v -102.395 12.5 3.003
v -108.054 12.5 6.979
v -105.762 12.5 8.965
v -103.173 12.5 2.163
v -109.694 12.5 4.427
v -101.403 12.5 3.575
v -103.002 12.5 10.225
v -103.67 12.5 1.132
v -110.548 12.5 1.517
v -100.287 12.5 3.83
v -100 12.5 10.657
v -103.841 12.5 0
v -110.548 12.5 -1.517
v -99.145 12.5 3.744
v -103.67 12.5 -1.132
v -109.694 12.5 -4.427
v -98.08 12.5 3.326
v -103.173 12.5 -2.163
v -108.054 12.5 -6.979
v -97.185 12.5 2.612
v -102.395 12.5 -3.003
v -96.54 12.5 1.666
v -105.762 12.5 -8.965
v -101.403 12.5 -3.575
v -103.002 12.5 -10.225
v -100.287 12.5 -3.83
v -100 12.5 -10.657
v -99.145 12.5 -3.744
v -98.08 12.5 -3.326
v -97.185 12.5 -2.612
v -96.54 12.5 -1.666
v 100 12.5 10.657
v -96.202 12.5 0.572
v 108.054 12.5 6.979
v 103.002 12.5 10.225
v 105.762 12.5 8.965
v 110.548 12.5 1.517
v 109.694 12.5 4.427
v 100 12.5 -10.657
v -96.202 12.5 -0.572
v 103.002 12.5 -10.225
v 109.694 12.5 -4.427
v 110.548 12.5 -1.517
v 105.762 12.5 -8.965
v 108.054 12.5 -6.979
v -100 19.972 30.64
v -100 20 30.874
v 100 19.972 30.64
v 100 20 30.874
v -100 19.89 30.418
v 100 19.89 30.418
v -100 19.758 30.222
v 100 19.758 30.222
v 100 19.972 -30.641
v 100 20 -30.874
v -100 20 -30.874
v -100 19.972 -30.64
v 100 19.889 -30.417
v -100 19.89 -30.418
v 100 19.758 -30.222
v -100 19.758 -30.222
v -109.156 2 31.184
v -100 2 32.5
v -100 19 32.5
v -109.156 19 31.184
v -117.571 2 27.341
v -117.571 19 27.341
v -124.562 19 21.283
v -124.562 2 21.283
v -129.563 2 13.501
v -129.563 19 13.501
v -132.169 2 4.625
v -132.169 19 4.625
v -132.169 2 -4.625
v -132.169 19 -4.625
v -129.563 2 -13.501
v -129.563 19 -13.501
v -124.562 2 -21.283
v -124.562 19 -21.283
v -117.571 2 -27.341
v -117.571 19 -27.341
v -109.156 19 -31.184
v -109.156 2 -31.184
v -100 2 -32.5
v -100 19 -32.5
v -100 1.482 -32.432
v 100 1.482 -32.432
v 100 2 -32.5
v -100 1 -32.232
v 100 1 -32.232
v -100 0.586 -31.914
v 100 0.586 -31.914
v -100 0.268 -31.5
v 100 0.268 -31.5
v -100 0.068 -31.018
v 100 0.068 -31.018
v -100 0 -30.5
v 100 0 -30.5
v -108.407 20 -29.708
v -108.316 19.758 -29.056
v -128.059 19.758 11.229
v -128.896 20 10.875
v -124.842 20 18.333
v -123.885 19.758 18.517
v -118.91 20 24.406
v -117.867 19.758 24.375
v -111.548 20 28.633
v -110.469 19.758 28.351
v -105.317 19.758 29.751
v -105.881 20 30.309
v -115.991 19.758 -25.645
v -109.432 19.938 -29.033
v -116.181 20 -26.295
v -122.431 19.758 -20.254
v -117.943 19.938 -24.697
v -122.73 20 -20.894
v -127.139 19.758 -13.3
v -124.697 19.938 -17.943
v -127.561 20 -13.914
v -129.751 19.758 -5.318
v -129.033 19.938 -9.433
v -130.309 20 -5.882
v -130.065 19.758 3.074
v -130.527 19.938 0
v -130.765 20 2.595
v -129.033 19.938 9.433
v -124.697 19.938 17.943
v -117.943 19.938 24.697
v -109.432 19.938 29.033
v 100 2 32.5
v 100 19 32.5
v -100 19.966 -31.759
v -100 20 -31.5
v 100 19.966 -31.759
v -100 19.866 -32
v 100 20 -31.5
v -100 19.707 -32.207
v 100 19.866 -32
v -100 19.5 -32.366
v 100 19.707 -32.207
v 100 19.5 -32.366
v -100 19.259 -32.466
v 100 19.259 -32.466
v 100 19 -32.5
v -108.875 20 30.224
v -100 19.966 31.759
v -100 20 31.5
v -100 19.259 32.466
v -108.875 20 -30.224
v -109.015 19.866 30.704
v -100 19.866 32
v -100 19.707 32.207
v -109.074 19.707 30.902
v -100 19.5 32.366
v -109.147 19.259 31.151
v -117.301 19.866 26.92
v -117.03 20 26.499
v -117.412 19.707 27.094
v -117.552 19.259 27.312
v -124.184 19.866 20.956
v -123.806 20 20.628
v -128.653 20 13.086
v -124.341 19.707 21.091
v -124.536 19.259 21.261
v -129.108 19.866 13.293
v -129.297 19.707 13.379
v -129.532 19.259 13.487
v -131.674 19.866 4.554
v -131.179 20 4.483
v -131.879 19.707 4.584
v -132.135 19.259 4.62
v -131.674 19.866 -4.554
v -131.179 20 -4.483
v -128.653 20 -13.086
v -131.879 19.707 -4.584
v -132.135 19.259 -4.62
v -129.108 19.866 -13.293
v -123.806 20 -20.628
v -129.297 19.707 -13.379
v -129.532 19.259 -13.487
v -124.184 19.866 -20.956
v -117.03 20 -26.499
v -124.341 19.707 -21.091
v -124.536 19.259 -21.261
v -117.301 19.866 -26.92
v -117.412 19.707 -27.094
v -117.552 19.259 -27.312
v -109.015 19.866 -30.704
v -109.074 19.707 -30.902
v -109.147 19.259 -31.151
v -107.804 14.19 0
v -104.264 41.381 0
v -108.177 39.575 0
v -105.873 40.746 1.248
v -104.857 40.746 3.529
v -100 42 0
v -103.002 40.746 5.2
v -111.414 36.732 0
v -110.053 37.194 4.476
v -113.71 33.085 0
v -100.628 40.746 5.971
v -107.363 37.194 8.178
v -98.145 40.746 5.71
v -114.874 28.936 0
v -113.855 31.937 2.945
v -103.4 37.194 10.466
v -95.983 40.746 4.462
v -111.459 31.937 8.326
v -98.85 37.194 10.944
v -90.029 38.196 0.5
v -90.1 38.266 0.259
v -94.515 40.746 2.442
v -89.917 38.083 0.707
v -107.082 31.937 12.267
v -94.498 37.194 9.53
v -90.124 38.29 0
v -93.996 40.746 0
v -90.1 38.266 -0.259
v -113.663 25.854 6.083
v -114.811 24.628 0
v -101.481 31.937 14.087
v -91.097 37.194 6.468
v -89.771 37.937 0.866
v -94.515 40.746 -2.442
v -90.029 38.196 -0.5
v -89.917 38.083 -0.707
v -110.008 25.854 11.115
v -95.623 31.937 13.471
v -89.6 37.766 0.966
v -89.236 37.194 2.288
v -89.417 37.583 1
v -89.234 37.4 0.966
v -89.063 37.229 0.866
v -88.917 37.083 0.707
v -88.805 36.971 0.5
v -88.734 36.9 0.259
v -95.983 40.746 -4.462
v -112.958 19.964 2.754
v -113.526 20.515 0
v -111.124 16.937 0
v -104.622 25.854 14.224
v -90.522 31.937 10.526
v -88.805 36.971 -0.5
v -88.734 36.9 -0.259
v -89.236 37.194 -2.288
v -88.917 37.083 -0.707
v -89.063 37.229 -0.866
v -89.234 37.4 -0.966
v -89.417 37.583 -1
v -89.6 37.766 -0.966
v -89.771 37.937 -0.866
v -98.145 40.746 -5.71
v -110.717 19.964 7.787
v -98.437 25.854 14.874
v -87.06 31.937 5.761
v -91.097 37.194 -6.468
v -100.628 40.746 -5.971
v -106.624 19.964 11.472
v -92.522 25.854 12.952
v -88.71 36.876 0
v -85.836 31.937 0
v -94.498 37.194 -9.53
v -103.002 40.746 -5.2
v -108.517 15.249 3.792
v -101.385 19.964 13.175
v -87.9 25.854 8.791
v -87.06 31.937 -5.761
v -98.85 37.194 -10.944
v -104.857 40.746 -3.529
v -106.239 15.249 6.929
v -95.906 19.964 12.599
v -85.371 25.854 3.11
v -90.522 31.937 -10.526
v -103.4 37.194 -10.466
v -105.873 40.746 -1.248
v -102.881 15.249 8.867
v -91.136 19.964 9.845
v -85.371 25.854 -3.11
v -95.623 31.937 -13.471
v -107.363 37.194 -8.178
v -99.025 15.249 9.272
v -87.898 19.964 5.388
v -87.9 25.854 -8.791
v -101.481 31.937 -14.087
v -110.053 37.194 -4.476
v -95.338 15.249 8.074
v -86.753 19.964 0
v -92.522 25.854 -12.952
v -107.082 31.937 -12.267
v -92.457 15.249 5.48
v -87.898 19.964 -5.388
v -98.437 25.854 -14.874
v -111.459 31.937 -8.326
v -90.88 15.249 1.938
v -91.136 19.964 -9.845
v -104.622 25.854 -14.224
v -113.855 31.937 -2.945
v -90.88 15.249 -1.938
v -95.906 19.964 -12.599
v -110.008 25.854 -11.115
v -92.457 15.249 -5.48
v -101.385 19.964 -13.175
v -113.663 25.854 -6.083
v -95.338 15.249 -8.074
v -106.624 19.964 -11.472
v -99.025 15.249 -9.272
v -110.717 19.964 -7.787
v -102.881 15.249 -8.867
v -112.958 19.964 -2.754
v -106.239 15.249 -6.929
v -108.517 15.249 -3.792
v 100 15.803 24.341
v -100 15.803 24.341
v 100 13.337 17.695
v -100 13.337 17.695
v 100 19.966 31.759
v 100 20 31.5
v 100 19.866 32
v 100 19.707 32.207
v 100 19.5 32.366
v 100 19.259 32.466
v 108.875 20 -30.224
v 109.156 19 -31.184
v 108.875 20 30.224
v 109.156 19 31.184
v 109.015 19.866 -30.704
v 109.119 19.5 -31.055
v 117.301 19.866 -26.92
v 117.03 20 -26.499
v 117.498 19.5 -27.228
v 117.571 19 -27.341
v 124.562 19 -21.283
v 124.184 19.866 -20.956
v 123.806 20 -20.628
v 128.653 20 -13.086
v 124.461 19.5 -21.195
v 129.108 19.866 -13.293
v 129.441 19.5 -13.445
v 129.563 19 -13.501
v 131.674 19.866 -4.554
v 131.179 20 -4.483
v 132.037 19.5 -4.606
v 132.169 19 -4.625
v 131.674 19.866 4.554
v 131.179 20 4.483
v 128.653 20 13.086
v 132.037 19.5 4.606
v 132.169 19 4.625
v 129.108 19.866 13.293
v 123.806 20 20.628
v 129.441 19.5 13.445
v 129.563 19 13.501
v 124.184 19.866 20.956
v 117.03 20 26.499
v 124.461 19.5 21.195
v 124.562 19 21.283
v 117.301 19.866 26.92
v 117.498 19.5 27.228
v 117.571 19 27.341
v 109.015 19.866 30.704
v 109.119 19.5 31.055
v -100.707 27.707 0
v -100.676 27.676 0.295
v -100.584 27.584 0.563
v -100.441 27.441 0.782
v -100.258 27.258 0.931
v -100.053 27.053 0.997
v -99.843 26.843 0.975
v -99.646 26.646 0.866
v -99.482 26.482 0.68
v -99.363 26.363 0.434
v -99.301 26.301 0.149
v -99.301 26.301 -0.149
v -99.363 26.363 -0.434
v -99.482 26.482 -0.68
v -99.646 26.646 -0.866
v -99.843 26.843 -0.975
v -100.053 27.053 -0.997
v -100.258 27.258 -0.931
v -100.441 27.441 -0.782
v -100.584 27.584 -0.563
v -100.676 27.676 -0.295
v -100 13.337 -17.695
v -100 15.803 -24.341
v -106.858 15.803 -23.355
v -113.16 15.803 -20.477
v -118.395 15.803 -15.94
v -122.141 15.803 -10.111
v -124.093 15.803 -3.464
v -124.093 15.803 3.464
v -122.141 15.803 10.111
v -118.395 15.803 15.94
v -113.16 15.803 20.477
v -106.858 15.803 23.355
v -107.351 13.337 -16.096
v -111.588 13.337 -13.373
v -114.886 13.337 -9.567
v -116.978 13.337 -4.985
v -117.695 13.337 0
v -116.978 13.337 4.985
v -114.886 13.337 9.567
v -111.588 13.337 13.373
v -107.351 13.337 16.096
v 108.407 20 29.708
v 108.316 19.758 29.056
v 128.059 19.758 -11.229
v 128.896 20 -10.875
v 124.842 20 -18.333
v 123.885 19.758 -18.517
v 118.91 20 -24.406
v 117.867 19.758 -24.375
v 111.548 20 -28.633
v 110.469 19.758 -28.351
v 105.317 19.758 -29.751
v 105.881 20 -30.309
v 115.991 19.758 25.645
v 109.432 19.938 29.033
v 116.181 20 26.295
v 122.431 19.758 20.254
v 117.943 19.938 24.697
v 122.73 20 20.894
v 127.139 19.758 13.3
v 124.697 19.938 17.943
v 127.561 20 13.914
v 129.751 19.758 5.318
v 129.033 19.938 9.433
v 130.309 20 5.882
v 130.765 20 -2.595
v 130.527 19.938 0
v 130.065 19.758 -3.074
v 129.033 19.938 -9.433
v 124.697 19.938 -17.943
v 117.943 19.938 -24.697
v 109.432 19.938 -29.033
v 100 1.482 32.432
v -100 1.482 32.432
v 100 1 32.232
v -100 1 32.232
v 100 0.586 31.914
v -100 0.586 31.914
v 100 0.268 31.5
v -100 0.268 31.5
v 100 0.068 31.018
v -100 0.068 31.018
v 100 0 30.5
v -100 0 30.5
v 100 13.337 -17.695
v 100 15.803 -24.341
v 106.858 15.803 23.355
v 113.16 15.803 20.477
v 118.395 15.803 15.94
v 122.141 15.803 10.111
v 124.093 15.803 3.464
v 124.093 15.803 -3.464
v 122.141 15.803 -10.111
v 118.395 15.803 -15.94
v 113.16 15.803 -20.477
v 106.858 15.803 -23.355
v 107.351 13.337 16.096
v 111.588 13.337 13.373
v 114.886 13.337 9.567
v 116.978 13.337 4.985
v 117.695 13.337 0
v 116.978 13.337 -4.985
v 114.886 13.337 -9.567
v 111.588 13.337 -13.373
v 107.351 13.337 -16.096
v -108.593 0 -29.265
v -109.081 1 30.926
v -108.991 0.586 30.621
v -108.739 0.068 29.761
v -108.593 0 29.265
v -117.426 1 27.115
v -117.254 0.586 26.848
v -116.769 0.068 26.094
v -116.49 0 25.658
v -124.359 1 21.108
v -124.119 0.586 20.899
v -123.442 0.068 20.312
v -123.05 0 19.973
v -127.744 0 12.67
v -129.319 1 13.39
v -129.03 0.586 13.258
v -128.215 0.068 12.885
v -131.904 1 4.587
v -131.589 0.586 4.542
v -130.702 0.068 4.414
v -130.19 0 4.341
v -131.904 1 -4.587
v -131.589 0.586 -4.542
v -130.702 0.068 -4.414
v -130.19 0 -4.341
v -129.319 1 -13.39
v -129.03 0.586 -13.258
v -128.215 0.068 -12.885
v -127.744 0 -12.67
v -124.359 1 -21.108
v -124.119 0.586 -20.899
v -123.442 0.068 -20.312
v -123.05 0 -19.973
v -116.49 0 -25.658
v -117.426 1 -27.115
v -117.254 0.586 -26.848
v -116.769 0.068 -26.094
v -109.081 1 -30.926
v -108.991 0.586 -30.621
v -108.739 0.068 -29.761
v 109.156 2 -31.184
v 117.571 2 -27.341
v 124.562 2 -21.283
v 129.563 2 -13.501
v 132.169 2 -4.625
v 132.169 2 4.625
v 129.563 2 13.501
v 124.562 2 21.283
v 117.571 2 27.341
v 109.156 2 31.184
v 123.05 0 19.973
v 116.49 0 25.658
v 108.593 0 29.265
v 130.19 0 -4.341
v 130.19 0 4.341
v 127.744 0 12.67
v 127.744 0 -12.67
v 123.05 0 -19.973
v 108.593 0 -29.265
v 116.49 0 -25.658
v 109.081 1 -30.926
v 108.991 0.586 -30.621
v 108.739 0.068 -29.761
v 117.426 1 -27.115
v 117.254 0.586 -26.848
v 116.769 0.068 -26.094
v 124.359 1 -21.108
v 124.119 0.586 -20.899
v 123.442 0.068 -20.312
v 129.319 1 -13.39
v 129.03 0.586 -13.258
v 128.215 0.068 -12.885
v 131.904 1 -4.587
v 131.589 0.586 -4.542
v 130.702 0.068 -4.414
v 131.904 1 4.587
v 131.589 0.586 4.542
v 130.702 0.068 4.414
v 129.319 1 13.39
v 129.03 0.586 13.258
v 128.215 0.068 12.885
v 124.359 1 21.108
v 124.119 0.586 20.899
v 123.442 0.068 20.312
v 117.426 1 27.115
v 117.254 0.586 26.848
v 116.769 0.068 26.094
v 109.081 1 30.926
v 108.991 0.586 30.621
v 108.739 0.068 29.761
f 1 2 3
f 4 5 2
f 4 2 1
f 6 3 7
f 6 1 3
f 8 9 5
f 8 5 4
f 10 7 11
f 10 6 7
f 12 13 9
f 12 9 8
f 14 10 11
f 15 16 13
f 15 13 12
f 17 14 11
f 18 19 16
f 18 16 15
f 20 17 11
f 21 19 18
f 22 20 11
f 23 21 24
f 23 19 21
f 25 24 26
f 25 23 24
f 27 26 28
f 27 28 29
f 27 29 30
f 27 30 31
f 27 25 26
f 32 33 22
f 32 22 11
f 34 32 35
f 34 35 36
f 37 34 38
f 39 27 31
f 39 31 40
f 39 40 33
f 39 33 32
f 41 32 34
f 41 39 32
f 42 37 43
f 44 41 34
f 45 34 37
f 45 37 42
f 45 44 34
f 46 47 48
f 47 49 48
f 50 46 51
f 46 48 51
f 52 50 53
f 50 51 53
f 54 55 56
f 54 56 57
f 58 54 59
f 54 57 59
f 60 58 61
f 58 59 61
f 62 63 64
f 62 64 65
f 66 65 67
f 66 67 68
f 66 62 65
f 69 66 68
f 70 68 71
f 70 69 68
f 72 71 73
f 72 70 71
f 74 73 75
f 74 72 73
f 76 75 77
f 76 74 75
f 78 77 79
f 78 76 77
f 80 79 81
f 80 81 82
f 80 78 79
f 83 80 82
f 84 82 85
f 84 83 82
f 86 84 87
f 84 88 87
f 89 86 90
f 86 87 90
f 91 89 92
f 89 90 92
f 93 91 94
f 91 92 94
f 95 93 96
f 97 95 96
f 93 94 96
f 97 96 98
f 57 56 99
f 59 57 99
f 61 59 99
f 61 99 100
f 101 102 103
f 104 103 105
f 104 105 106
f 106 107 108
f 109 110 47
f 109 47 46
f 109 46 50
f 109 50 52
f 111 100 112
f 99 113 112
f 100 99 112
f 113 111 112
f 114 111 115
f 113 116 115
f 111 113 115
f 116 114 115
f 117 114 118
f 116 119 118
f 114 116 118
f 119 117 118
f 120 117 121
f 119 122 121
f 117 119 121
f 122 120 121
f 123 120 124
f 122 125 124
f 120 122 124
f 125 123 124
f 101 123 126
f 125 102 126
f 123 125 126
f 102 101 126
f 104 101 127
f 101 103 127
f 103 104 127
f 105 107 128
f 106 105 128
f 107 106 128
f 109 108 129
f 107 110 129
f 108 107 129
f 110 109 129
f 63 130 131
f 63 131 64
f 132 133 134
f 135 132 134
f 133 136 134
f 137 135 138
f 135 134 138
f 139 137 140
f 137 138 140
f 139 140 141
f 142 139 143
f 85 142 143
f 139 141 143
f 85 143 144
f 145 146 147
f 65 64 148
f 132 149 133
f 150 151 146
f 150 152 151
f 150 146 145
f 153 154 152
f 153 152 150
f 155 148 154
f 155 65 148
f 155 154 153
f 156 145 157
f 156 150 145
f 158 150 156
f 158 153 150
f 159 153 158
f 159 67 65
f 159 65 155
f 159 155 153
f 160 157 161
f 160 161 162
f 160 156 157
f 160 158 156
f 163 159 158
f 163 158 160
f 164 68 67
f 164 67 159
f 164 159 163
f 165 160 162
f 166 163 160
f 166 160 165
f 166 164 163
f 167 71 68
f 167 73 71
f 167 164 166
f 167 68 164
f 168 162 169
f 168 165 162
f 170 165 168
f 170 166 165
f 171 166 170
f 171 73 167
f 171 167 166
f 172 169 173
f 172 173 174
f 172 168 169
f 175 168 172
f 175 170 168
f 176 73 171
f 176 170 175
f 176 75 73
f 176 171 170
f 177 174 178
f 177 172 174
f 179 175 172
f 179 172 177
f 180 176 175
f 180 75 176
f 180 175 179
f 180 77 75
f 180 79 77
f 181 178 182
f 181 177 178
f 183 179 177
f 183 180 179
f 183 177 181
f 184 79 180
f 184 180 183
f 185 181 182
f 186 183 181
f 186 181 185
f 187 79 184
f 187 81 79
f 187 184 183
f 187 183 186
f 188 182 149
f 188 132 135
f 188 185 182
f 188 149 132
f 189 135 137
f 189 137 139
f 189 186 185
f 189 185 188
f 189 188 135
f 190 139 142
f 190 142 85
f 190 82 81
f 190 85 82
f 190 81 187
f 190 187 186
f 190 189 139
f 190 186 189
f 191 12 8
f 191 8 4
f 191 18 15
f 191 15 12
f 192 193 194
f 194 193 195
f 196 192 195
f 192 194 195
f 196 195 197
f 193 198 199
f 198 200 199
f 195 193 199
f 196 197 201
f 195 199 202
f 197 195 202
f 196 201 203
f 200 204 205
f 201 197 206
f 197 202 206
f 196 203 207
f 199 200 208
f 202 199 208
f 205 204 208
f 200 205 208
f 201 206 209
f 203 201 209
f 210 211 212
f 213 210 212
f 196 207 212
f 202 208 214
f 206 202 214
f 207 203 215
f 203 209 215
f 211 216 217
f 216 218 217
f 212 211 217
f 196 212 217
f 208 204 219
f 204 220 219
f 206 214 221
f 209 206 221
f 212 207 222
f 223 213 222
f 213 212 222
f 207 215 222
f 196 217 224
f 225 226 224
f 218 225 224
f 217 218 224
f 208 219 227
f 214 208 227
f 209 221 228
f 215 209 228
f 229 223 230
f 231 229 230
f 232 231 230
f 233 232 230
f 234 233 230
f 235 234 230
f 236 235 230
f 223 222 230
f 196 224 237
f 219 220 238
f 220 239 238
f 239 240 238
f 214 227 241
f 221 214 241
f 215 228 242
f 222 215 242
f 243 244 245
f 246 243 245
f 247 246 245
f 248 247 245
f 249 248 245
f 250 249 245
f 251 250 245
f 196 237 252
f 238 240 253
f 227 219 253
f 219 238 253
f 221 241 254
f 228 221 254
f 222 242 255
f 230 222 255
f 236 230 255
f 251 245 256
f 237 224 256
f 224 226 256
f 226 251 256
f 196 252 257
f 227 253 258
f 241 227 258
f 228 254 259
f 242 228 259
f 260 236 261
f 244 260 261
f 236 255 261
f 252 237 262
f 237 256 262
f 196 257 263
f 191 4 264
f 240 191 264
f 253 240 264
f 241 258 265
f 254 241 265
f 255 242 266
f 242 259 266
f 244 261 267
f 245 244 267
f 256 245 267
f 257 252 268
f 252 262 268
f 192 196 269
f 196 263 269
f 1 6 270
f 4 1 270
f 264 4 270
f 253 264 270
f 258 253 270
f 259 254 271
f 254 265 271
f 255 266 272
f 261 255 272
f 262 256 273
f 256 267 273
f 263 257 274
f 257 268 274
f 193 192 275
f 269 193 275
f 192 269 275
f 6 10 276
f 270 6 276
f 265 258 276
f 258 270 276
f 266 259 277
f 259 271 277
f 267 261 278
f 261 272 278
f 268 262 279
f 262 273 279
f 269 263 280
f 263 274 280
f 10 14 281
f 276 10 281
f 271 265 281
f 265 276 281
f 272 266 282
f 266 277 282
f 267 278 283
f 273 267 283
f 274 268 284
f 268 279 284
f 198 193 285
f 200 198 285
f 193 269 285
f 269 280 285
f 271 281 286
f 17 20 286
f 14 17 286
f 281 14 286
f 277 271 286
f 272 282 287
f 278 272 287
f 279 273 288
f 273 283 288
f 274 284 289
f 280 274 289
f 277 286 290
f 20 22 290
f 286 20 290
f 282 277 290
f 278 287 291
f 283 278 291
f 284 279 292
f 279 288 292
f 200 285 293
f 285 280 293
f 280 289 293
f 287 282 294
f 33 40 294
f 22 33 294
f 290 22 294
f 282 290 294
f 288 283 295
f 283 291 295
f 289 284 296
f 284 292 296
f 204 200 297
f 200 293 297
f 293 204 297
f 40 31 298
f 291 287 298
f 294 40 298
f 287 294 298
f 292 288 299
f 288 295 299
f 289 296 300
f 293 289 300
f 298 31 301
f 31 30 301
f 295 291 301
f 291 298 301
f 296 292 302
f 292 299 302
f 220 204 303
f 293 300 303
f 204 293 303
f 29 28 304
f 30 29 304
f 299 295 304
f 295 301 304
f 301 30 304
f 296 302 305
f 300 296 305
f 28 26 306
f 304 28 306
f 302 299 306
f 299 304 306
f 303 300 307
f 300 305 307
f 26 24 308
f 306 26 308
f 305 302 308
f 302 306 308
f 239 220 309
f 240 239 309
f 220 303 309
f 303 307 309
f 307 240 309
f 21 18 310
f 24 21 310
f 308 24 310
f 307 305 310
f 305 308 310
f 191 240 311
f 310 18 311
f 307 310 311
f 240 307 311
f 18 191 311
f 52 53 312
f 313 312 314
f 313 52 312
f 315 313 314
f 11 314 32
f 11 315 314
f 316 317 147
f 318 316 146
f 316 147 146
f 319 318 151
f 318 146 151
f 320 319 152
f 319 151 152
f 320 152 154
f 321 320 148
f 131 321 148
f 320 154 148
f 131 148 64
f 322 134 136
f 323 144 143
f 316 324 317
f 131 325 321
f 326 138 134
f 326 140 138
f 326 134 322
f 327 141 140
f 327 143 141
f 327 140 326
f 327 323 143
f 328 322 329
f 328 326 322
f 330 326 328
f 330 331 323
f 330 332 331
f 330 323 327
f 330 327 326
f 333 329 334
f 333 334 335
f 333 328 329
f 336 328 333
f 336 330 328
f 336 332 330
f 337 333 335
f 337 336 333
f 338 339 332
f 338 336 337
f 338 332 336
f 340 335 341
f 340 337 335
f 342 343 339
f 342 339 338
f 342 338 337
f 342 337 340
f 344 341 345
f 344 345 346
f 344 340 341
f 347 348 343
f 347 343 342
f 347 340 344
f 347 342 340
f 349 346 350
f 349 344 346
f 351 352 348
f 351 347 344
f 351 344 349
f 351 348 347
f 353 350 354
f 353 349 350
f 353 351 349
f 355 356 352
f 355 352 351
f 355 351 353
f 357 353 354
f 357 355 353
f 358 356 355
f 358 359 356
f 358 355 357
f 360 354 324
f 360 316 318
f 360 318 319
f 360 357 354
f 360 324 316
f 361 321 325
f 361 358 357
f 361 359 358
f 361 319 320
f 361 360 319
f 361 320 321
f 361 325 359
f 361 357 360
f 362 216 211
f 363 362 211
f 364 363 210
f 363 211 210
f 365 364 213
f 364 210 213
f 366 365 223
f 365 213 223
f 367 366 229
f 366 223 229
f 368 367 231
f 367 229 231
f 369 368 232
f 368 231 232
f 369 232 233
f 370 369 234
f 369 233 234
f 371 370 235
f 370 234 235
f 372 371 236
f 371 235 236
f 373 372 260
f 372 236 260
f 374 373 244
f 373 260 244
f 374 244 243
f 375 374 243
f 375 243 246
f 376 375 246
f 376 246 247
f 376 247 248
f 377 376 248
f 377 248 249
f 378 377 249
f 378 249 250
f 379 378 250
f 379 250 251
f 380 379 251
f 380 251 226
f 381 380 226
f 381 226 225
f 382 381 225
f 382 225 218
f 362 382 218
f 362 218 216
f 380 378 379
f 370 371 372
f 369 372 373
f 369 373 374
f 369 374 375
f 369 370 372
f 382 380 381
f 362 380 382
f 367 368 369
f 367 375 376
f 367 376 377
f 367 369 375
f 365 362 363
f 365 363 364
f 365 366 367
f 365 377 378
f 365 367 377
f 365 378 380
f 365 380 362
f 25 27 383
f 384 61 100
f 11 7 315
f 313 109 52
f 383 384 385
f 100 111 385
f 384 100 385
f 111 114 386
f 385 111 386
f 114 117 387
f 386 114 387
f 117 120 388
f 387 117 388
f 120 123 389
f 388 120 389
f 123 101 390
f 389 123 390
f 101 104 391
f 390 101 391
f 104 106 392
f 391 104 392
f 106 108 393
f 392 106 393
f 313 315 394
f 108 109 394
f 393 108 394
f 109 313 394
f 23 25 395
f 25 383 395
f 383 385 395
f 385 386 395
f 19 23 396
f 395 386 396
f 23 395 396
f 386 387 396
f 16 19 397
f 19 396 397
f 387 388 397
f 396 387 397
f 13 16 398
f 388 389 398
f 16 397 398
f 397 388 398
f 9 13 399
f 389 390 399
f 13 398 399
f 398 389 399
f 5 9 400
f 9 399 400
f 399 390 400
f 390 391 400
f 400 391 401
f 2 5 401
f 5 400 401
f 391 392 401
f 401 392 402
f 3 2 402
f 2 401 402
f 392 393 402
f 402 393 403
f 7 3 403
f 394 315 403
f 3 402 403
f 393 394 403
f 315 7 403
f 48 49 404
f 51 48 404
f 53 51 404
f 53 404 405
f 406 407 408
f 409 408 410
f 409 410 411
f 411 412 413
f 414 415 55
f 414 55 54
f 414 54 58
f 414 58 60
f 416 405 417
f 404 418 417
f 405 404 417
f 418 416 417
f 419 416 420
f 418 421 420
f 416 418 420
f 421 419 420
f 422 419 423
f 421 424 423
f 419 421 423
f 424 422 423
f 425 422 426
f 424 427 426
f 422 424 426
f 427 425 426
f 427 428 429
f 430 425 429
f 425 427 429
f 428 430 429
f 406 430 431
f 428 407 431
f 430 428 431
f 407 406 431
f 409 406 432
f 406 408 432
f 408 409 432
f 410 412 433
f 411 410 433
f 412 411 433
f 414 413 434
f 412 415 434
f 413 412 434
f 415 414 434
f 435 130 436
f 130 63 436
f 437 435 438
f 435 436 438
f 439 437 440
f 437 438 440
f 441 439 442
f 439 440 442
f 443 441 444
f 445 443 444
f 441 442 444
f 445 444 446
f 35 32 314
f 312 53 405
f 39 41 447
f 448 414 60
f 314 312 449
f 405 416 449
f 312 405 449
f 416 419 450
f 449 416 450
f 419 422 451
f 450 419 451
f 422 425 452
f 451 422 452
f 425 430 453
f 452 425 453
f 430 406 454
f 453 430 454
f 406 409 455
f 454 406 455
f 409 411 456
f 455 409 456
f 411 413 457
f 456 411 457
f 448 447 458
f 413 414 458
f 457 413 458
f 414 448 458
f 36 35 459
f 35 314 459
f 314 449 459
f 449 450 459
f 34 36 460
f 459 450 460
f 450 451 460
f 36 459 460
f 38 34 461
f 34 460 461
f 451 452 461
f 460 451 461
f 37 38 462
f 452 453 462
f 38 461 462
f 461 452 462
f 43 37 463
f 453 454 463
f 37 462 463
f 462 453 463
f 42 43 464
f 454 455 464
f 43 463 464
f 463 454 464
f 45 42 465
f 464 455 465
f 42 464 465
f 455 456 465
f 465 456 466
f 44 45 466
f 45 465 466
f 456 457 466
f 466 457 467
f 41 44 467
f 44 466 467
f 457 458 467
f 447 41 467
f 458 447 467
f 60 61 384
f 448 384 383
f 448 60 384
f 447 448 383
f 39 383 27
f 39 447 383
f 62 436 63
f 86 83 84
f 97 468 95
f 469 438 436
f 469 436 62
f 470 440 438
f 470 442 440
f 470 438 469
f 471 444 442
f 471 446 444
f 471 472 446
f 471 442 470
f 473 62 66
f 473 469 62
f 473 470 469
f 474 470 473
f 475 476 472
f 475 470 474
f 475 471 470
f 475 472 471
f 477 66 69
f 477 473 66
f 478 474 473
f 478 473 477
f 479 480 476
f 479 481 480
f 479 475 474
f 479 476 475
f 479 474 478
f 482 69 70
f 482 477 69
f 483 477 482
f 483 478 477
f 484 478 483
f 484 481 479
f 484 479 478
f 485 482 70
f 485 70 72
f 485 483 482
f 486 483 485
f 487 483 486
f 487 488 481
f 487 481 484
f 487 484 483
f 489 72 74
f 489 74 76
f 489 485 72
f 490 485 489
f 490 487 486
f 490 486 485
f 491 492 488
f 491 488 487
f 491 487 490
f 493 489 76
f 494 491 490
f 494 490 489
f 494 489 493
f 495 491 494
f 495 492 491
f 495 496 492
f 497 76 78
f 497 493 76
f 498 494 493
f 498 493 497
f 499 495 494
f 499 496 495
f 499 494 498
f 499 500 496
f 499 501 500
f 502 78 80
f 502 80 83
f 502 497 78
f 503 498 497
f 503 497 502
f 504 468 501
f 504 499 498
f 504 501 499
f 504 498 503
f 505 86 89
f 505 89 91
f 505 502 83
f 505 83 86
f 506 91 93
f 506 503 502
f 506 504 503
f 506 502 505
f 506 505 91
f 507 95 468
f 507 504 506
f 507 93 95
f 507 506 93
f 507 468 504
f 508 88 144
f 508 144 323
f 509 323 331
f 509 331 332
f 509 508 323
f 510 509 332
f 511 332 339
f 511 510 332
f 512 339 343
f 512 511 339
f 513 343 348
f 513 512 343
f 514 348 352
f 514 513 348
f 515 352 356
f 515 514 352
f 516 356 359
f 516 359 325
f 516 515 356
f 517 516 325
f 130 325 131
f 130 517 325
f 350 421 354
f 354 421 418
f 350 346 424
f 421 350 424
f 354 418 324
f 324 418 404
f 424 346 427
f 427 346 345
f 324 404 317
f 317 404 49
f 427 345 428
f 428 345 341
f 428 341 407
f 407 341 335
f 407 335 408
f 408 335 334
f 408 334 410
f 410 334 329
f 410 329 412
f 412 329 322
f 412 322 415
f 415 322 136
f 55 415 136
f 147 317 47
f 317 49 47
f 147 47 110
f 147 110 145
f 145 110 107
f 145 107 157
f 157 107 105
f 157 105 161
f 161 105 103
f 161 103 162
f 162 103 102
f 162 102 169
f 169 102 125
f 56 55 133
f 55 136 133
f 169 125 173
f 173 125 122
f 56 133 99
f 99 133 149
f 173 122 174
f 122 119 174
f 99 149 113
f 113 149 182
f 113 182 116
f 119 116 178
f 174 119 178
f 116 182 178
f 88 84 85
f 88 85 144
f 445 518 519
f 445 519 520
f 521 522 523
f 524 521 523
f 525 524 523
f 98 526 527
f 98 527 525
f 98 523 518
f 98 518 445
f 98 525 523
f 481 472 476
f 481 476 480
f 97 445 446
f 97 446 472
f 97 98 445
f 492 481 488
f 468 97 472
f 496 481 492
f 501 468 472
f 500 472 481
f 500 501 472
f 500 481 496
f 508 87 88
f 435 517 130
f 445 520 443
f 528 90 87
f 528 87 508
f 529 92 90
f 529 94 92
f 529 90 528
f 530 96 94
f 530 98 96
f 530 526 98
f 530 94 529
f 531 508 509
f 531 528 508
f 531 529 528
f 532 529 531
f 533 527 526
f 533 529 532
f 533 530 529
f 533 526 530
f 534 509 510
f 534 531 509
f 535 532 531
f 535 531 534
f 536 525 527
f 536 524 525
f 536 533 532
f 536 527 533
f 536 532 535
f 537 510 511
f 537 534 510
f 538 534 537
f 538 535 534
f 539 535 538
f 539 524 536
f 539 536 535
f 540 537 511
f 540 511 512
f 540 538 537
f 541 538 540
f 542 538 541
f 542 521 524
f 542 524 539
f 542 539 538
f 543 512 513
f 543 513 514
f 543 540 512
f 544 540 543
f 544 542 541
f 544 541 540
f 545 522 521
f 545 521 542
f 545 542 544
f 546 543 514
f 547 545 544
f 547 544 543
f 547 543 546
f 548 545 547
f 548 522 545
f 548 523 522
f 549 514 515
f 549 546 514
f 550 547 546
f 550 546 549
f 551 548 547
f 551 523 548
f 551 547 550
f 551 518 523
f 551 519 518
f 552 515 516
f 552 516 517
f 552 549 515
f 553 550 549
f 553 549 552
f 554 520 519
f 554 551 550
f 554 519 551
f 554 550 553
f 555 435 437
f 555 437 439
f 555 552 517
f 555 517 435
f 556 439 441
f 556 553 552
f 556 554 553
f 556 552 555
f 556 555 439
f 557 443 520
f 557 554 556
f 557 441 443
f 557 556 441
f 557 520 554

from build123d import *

# Parameters (mm, degrees)
BOSS_EXTRUDE1_DEPTH = 20
CUT_EXTRUDE1_DEPTH  = 7.5
FILLET1_R           = 30
FILLET2_R           = 1
FILLET3_R           = 2
SKETCH6_R           = 1
CUT_EXTRUDE2_DEPTH  = 15


with BuildPart() as part:
    # Sketch1 → Boss-Extrude1 (new body)
    with BuildSketch(Plane(origin=(0, 0, 0), x_dir=(1, 0, 0), z_dir=(0, 1, 0))):
        with BuildLine():
            Line((-100, 32.5), (100, 32.5))
            ThreePointArc((100, 32.5), (132.5, 0), (100, -32.5))
            Line((100, -32.5), (-100, -32.5))
            ThreePointArc((-100, -32.5), (-132.5, 0), (-100, 32.5))
        make_face()
    extrude(amount=BOSS_EXTRUDE1_DEPTH)

    # Sketch2 → Cut-Extrude1 (cut)
    with BuildSketch(Plane(origin=(0, 20, 0), x_dir=(1, 0, 0), z_dir=(0, 1, 0))):
        with BuildLine():
            Line((-100, -30.5), (100, -30.5))
            ThreePointArc((100, -30.5), (130.5, 0), (100, 30.5))
            Line((100, 30.5), (-100, 30.5))
            ThreePointArc((-100, 30.5), (-130.5, 0), (-100, -30.5))
        make_face()
    extrude(amount=-CUT_EXTRUDE1_DEPTH, mode=Mode.SUBTRACT)

    # Fillet1
    # the kernel refuses this fillet: 30 mm, written as the material it adds along each edge
    with BuildSketch(Plane(origin=(100, 12.5, -30.5), x_dir=(0, 1, 0), z_dir=(-1, 0, 0)), Plane(origin=(-100, 12.5, 30.5), x_dir=(0, 1, 0), z_dir=(1, 0, 0))) as fillet1_piece_1:
        with BuildLine():
            CenterArc((30, -19.843134833), FILLET1_R, 138.590377891, 41.409622109)
            Line((0, -19.843134833), (-0.6, -19.843134833))
            Line((-0.6, -19.843134833), (-0.6, 0))
            Line((-0.6, 0), (0, 0.6))
            ThreePointArc((0, 0.6), (3.75, 0.6), (7.05, 0.396862697))
            Line((7.05, 0.396862697), (7.5, 0))
        make_face()
    extrude(amount=200)
    with BuildSketch(Plane(origin=(-100, 12.5, 0), x_dir=(0, 0, -1), z_dir=(1, 0, 0))) as fillet1_piece_2:
        with BuildLine():
            CenterArc((10.656865167, 30), FILLET1_R, 270, 41.409622109)
            Line((10.656865167, 0), (10.656865167, -0.6))
            Line((10.656865167, -0.6), (30.5, -0.6))
            Line((30.5, -0.6), (31.1, 0))
            ThreePointArc((31.1, 0), (31.1, 3.75), (30.896862697, 7.05))
            Line((30.896862697, 7.05), (30.5, 7.5))
        make_face()
    revolve(axis=Axis((-100, 12.5, 0), (0, 1, 0)), revolution_arc=180)
    with BuildSketch(Plane(origin=(100, 12.5, 0), x_dir=(0, 0, 1), z_dir=(-1, 0, 0))) as fillet1_piece_3:
        with BuildLine():
            CenterArc((10.656865167, 30), FILLET1_R, 270, 41.409622109)
            Line((10.656865167, 0), (10.656865167, -0.6))
            Line((10.656865167, -0.6), (30.5, -0.6))
            Line((30.5, -0.6), (31.1, 0))
            ThreePointArc((31.1, 0), (31.1, 3.75), (30.896862697, 7.05))
            Line((30.896862697, 7.05), (30.5, 7.5))
        make_face()
    revolve(axis=Axis((100, 12.5, 0), (0, 1, 0)), revolution_arc=180)

    # Fillet2
    fillet2_edges = [part.edges().sort_by_distance(p)[0] for p in [
        (132.5, 20, 0),
        (0, 20, -32.5),
        (-130.5, 20, 0),
        (0, 20, 30.5),
        (130.5, 20, 0),
        (0, 20, -30.5),
        (-132.5, 20, 0),
        (0, 20, 32.5),
    ]]
    fillet(fillet2_edges, radius=FILLET2_R)

    # Fillet3
    fillet3_edges = [part.edges().sort_by_distance(p)[0] for p in [
        (0, 0, -32.5),
        (132.5, 0, 0),
        (0, 0, 32.5),
        (-132.5, 0, 0),
    ]]
    fillet(fillet3_edges, radius=FILLET3_R)

    # Sketch4 → Revolve1 (revolve)
    with BuildSketch(Plane.XY):
        with BuildLine():
            Line((-100, 12), (-100, 42))
            ThreePointArc((-100, 42), (-115, 27), (-100, 12))
        make_face()
    revolve(axis=Axis((-100, 12, 0), (0, 1, 0)))

    # Sketch6 → Cut-Extrude2 (cut)
    with BuildSketch(Plane(origin=(-25.893398282, -25.893398282, 0), x_dir=(0.7071067811865488, -0.7071067811865464, 0), z_dir=(0.7071067811865464, 0.7071067811865488, 0))):
        with Locations(Location((-89.802561211, 0, 0), (0, 0, 180))):
            Circle(SKETCH6_R)
    extrude(amount=-CUT_EXTRUDE2_DEPTH, mode=Mode.SUBTRACT)


solid = part.part
